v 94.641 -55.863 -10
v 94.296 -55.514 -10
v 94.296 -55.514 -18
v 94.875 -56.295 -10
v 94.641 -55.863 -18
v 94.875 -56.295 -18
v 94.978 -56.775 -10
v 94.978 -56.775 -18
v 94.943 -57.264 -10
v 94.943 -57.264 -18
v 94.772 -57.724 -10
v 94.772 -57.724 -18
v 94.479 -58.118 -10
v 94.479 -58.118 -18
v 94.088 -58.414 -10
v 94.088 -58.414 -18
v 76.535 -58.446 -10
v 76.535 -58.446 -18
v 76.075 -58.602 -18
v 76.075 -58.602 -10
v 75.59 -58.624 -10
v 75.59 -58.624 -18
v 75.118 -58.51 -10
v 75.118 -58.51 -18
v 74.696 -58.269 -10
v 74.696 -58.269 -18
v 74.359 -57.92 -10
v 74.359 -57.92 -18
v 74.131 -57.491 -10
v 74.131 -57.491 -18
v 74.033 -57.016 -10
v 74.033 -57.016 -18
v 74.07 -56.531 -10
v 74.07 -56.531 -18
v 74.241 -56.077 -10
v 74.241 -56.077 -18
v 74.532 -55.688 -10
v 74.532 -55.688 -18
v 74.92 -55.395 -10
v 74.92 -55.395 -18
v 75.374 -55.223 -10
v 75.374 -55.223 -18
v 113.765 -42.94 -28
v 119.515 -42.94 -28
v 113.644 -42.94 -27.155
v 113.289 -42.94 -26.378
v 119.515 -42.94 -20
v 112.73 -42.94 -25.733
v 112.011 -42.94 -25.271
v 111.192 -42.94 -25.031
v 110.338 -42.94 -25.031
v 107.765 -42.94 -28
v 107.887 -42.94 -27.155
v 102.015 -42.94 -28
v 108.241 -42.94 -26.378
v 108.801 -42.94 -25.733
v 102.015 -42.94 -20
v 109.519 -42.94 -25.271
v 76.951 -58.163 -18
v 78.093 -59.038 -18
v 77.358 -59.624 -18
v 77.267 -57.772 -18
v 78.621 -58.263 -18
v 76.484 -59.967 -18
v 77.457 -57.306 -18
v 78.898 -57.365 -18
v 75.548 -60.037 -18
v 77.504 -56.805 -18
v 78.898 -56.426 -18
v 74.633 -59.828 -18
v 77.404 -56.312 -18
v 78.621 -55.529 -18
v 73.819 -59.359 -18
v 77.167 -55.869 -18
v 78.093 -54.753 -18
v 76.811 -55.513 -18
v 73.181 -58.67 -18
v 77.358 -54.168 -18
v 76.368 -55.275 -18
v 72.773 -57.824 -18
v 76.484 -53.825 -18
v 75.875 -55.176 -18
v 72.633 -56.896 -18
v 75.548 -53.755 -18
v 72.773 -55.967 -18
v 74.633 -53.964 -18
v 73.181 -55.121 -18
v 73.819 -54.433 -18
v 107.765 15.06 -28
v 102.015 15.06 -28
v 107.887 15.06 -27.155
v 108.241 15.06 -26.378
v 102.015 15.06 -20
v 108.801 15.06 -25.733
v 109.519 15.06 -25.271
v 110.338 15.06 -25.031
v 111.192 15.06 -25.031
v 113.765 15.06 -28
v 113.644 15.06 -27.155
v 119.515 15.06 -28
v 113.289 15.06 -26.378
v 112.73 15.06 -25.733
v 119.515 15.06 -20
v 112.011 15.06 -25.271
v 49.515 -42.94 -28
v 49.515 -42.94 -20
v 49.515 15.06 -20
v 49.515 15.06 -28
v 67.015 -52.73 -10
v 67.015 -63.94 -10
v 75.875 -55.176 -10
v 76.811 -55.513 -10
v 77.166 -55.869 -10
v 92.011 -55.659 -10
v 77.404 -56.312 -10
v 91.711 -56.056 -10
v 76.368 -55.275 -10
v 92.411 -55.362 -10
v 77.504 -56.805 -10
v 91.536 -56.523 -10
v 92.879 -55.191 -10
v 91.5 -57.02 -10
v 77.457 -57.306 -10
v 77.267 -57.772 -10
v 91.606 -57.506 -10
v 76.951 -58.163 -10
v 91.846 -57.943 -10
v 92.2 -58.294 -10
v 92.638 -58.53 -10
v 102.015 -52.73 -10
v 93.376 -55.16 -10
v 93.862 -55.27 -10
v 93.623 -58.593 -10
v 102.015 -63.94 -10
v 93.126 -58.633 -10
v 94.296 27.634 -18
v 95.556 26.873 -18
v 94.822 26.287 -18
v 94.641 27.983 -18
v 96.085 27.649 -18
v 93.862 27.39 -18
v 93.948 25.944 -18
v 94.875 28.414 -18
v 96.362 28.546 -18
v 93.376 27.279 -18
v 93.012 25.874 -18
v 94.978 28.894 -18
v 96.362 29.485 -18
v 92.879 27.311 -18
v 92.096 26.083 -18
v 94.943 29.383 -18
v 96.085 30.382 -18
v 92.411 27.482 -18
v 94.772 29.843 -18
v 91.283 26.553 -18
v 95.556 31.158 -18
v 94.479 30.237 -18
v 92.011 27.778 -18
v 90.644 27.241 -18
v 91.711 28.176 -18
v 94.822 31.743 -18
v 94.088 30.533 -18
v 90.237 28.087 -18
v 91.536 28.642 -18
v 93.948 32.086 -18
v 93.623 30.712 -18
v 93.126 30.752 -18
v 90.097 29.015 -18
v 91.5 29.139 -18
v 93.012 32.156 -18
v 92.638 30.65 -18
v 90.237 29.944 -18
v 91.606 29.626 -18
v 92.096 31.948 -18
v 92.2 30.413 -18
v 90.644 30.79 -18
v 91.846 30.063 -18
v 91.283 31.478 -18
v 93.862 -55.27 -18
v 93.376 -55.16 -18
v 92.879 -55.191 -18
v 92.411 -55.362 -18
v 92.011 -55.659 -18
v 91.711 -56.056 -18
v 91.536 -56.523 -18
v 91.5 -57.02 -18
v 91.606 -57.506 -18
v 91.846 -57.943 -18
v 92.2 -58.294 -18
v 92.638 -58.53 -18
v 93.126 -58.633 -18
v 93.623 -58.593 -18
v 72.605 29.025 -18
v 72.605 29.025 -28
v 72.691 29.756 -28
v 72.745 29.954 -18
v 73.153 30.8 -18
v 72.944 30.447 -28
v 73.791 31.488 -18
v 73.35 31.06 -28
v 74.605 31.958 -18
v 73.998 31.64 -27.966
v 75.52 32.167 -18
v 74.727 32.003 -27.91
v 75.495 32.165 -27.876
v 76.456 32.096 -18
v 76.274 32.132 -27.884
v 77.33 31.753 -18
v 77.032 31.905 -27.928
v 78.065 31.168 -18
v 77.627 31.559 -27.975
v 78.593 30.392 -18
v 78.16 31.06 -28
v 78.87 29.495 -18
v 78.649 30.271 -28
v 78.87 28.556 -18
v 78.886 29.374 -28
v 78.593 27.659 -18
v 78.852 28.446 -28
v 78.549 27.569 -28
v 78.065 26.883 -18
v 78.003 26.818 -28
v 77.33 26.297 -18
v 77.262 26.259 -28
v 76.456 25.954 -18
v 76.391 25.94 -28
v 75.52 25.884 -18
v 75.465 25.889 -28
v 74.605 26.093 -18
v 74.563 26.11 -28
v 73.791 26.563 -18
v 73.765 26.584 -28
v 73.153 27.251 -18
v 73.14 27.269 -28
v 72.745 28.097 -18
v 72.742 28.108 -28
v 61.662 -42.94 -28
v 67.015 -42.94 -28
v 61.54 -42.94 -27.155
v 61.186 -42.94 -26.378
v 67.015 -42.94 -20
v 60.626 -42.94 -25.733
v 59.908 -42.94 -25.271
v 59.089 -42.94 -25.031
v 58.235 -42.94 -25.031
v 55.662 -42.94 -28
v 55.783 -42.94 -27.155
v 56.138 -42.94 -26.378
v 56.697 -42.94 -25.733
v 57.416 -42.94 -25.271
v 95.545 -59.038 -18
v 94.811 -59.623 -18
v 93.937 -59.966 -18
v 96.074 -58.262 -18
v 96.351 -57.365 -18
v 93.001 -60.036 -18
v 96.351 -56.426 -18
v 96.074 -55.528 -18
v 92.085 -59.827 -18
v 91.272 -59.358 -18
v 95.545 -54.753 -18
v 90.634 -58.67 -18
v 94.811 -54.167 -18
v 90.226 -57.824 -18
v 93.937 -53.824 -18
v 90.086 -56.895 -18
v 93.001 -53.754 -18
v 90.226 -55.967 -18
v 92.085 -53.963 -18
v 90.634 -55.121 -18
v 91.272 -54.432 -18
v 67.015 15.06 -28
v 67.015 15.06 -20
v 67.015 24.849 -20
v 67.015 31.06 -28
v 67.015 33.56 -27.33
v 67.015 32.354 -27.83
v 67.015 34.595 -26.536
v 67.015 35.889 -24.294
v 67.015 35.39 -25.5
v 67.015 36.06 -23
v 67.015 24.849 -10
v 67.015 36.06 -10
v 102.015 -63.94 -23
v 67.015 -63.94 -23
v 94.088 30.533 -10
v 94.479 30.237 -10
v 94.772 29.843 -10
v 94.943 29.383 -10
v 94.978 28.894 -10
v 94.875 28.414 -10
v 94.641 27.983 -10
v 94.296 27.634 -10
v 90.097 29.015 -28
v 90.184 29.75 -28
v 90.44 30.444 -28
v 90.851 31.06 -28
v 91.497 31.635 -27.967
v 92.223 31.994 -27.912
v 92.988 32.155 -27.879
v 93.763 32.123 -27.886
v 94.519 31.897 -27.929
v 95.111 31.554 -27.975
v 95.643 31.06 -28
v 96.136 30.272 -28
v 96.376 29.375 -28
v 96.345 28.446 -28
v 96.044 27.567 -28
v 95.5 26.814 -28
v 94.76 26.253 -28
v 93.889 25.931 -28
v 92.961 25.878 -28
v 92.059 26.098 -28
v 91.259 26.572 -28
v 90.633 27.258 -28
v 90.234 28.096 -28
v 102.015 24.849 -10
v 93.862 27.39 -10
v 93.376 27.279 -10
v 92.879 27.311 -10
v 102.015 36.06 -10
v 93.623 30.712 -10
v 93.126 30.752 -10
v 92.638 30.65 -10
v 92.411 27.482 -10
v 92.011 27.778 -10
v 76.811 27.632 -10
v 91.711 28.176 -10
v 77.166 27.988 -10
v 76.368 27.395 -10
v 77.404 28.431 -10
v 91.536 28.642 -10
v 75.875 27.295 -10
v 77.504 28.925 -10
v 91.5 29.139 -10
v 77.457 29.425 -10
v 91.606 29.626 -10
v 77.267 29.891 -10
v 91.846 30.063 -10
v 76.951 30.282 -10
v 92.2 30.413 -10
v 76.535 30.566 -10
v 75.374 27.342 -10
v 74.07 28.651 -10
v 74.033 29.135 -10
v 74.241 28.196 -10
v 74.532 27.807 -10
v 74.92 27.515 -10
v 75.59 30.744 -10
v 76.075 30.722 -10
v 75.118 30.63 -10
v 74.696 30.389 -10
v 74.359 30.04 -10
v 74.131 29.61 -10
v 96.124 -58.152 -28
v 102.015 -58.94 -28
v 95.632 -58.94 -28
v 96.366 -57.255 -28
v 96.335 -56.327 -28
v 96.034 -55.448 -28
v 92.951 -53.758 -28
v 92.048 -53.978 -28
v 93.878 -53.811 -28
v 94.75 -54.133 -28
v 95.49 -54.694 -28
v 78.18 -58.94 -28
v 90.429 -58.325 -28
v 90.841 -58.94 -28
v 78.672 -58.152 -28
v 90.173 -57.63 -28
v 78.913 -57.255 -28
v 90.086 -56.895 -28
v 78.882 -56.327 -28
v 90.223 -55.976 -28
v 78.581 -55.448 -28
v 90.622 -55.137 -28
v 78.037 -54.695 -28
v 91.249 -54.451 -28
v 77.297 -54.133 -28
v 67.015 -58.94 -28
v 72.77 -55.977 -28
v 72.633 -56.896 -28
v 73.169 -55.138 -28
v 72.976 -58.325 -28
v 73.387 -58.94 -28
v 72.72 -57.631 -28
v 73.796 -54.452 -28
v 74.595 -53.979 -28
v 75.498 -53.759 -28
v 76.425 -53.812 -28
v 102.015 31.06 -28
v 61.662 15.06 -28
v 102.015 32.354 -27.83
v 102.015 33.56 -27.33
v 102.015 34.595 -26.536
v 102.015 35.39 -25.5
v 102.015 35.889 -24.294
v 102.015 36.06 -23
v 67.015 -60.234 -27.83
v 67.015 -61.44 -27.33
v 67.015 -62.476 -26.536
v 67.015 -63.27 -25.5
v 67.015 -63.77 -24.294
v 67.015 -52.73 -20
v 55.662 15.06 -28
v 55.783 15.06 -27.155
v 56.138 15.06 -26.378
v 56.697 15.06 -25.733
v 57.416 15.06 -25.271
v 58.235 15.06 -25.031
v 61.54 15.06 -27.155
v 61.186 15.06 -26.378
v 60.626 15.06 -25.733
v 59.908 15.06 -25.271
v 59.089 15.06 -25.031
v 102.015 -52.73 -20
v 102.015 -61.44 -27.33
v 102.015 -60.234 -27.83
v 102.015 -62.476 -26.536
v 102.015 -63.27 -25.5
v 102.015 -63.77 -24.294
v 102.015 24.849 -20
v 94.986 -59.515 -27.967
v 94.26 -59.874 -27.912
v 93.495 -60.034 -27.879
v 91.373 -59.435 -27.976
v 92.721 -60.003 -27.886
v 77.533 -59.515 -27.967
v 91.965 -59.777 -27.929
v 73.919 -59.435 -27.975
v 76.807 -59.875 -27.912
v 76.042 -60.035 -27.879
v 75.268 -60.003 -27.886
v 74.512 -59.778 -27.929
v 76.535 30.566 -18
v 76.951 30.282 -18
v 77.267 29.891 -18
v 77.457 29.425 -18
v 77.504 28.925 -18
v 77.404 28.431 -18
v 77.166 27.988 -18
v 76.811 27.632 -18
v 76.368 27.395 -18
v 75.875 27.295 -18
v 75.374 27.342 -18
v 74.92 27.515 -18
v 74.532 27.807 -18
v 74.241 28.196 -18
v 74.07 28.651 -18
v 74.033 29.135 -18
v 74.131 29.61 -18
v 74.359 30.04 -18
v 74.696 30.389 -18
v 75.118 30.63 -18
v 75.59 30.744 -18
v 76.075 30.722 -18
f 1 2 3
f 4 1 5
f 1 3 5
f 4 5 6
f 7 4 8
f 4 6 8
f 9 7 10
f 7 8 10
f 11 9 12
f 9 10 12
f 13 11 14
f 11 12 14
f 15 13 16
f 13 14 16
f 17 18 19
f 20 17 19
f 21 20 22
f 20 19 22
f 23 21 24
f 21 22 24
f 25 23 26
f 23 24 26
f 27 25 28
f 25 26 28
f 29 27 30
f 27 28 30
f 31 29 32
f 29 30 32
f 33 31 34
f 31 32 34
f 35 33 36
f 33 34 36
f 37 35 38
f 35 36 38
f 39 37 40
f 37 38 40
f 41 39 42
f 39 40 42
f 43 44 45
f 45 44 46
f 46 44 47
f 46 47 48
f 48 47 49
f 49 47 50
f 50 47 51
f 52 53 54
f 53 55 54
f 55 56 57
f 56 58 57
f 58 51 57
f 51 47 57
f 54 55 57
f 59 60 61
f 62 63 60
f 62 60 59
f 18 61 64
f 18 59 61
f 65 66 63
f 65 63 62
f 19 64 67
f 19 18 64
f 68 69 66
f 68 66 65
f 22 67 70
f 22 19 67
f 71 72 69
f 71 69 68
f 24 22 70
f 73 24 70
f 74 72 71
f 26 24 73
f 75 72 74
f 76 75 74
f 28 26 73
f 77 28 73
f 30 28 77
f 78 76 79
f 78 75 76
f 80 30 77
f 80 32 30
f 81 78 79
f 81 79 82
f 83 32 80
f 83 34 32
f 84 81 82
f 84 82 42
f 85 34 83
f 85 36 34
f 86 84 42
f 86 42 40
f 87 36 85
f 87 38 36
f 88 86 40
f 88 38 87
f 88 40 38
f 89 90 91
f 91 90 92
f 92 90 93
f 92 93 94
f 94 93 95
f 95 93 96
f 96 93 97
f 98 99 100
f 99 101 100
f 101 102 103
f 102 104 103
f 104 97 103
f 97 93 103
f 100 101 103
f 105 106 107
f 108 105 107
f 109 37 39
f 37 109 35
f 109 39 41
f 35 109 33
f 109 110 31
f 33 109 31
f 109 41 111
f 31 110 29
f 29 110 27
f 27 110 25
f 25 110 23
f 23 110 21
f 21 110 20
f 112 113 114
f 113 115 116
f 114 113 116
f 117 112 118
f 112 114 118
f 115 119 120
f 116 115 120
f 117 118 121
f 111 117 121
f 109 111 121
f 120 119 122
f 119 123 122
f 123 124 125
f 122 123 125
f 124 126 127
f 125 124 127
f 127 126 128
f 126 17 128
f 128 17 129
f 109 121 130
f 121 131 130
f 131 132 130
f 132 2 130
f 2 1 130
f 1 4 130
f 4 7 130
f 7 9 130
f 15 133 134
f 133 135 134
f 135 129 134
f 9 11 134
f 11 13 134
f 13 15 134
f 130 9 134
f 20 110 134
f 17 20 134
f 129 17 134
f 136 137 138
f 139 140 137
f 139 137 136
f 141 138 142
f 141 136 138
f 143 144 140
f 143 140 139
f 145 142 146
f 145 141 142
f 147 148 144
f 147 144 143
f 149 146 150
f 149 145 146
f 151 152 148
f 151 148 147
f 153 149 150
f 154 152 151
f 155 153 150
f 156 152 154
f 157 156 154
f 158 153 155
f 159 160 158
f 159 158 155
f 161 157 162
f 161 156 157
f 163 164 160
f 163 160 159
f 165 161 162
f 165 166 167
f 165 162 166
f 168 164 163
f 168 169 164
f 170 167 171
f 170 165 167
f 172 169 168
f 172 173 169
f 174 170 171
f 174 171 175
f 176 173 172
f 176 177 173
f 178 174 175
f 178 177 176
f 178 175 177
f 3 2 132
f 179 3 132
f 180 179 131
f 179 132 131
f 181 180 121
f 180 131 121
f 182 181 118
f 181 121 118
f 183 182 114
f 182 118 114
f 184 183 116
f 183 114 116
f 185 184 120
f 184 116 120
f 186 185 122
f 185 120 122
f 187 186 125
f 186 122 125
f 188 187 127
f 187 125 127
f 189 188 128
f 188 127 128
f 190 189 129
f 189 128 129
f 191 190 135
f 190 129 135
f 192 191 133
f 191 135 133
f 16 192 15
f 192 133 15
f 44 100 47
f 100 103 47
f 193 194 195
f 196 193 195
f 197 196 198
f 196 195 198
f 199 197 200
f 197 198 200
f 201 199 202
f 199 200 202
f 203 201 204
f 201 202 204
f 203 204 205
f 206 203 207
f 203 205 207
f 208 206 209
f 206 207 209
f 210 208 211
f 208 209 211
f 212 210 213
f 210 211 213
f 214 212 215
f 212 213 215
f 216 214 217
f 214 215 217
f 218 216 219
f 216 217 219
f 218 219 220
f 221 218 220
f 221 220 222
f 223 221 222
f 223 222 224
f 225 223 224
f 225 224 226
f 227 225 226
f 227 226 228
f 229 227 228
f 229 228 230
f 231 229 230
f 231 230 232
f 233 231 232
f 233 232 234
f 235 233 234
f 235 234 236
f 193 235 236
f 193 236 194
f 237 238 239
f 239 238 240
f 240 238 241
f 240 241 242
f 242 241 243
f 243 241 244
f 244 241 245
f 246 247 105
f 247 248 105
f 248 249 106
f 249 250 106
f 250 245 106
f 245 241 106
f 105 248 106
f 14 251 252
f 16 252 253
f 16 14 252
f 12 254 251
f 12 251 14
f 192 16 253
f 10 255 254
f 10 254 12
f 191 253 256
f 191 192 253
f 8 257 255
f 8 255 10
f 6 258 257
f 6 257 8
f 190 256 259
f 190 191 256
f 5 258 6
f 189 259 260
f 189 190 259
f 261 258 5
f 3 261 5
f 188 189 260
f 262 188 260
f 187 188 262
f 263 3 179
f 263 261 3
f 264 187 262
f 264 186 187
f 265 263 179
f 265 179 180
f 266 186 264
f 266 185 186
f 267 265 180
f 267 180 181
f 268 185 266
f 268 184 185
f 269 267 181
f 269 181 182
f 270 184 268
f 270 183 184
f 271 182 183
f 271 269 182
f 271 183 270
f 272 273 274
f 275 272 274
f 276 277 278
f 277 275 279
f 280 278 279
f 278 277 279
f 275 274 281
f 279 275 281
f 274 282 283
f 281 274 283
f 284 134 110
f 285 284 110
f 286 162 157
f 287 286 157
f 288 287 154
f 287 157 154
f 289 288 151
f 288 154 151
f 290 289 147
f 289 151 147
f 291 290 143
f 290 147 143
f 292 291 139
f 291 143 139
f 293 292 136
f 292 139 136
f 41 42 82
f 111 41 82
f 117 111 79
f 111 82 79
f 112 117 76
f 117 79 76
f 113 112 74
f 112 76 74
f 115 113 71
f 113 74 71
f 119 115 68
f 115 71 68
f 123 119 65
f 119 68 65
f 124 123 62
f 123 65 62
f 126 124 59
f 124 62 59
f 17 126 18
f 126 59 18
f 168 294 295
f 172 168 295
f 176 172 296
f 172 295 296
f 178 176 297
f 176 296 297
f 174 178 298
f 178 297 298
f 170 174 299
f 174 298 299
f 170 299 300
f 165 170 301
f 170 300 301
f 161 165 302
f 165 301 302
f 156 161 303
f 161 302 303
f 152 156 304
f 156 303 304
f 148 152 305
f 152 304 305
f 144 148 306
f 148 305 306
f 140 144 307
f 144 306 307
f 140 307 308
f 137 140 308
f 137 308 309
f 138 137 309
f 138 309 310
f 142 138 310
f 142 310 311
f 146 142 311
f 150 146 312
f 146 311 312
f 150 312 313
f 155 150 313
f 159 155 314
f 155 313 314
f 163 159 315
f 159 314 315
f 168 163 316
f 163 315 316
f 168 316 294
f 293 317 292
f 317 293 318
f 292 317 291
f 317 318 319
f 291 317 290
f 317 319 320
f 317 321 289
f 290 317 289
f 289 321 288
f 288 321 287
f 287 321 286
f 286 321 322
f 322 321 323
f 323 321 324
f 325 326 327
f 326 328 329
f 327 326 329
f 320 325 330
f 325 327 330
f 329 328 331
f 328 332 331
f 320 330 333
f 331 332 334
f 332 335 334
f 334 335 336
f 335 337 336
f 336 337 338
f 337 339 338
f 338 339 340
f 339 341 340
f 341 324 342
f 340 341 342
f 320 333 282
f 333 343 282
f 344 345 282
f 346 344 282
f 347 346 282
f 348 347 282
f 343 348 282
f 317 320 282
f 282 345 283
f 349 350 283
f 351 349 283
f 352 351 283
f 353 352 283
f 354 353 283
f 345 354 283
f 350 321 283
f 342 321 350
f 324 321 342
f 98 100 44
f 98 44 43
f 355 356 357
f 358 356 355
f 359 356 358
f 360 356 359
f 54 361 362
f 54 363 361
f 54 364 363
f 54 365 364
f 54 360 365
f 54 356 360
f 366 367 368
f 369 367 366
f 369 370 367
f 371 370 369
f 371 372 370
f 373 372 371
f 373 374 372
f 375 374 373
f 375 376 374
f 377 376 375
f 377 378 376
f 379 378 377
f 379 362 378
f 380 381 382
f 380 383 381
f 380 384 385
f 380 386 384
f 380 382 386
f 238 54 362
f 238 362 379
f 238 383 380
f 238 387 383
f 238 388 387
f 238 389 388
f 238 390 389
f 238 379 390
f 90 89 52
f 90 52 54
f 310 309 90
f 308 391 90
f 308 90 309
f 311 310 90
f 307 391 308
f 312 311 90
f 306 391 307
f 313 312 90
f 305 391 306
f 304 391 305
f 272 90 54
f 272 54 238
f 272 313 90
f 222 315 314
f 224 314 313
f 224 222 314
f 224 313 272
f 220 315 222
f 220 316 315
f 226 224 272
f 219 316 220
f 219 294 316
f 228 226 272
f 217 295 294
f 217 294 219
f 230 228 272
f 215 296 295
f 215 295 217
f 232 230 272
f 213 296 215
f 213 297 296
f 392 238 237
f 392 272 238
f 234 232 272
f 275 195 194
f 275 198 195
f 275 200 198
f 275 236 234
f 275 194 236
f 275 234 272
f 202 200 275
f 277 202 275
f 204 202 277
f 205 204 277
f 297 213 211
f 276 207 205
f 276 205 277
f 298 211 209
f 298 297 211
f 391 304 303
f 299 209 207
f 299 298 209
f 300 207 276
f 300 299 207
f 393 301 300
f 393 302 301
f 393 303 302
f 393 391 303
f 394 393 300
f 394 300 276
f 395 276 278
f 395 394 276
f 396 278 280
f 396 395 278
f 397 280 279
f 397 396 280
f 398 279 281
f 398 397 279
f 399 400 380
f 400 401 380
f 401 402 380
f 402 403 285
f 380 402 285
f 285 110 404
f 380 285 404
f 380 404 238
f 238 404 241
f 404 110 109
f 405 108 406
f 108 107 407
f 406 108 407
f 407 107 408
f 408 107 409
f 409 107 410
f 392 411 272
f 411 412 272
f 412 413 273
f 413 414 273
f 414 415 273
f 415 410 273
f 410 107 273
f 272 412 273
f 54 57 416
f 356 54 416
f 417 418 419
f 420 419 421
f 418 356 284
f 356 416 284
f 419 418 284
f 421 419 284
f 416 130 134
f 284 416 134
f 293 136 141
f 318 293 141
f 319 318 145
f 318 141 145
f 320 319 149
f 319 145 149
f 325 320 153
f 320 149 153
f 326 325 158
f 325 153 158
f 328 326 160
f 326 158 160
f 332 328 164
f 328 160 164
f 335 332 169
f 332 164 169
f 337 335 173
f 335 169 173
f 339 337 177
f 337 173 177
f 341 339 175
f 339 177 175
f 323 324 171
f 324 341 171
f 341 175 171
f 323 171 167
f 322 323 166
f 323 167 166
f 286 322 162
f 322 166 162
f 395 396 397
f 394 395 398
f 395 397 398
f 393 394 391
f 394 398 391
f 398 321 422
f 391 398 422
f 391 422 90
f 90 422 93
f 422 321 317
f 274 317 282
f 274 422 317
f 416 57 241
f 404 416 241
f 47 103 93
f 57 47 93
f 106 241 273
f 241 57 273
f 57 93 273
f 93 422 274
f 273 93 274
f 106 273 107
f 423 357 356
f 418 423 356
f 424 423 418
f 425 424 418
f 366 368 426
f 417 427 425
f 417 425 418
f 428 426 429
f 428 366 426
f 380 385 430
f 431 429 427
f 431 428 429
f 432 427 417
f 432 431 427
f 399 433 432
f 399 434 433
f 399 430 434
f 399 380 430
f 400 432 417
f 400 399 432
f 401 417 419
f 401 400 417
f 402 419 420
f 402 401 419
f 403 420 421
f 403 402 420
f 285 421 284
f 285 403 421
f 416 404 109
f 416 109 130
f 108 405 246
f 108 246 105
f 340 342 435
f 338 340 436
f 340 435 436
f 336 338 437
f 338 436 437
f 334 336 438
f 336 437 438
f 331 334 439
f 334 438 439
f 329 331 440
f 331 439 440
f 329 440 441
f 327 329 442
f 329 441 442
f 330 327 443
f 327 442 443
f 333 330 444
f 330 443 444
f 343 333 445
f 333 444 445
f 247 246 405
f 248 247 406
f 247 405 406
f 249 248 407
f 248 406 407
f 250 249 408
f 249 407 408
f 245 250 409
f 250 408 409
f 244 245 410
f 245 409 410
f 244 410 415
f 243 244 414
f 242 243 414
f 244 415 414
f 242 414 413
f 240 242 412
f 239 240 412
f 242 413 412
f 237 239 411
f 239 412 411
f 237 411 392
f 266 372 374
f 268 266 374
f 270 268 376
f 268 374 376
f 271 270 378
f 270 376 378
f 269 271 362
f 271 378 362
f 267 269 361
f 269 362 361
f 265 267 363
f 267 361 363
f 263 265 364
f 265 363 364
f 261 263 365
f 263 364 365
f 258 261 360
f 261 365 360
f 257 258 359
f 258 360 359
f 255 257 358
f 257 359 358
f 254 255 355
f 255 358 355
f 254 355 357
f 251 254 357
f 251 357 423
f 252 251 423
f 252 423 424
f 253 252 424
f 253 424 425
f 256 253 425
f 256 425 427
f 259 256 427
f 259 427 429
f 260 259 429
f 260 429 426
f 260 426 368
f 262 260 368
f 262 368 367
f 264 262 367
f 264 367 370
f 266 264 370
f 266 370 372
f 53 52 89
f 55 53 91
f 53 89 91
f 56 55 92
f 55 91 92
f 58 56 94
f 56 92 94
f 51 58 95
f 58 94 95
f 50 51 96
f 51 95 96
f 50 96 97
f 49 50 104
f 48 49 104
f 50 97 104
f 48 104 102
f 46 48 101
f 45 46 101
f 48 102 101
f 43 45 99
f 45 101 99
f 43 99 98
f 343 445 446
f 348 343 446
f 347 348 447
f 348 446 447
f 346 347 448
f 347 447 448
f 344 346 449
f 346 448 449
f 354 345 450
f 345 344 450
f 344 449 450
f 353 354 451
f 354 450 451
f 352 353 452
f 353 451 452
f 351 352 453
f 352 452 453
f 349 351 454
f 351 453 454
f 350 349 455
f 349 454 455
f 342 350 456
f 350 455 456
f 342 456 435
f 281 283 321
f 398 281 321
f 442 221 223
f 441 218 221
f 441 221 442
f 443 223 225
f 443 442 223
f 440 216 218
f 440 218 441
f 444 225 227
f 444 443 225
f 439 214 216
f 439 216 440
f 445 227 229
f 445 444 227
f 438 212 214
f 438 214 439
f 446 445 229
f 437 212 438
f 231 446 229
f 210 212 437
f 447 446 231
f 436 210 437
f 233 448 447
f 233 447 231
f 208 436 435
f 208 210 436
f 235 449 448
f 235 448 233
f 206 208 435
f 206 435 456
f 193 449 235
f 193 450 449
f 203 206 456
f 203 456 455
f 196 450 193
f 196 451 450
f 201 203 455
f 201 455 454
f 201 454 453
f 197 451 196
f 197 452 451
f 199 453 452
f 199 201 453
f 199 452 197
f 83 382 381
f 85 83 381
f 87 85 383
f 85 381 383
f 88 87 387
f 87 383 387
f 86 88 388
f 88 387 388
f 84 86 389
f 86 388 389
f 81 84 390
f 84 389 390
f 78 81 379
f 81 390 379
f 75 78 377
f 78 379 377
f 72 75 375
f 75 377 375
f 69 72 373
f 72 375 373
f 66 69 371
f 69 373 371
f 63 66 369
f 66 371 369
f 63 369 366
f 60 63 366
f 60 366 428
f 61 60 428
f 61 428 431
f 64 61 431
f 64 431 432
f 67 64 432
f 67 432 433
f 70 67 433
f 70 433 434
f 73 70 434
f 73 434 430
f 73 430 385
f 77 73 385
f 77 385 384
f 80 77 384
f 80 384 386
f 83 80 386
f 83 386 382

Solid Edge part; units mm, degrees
sketch "Sketch1" plane through (0, 0, -20) normal (0, 0, -1) x (-1, 0, 0)
  line L0 (-67.0152, -63.9403) -> (-67.0152, -42.9403)
  line L1 (-67.0152, -42.9403) -> (-49.5152, -42.9403)
  line L2 (-49.5152, -42.9403) -> (-49.5152, 15.0597)
  line L3 (-49.5152, 15.0597) -> (-67.0152, 15.0597)
  line L4 (-67.0152, 15.0597) -> (-67.0152, 36.0597)
  line L5 (-67.0152, 36.0597) -> (-102.0152, 36.0597)
  line L6 (-102.0152, 36.0597) -> (-102.0152, 15.0597)
  line L7 (-102.0152, 15.0597) -> (-119.5152, 15.0597)
  line L8 (-119.5152, 15.0597) -> (-119.5152, -42.9403)
  line L9 (-119.5152, -42.9403) -> (-102.0152, -42.9403)
  line L10 (-102.0152, -42.9403) -> (-102.0152, -63.9403)
  line L11 (-102.0152, -63.9403) -> (-67.0152, -63.9403)
  circle A0 centre (-75.7833, -56.8959) radius 1.7228
  circle A1 centre (-93.2363, -56.8951) radius 1.741
  circle A2 centre (-93.247, 29.0153) radius 1.735
  circle A3 centre (-75.7554, 29.0254) radius 1.7262
extrude "Protrusion1" add sketch "Sketch1" along normal blind 8
sketch "Sketch2" plane through (84.5152, -13.9403, -20) normal (0, 0, 1) x (0, -1, 0)
  arc A0 (-41.5739, 9.7812) -> (-44.4734, 9.5724) centre (-42.9556, 8.7318) ccw
  arc A1 (-44.4734, 9.5724) -> (-41.5739, 9.7812) centre (-42.9548, 8.7211) ccw
  line L0 (-38.7893, 17.5) -> (-38.7893, -17.5)
  line L1 (-38.7893, -17.5) -> (-50, -17.5)
  line L2 (-50, -17.5) -> (-50, 17.5)
  line L3 (-50, 17.5) -> (-38.7893, 17.5)
  arc A2 (-44.5058, -7.9803) -> (-41.2822, -9.1415) centre (-42.9657, -8.7598) ccw
  arc A3 (-41.2822, -9.1415) -> (-44.5058, -7.9803) centre (-42.9556, -8.7318) ccw
extrude "ExtrudedCutout_1" add sketch "Sketch2" along normal blind 10
fillet "Round_1" radius 5 1 edges at (84.5152, 36.0597, -28)
mirror "Mirror1" about plane through (84.5152, -13.9403, -24) normal (0, -1, 0) of "ExtrudedCutout_1"
fillet "Round1" radius 5 1 edges at (84.5152, -63.9403, -28)
sketch "Sketch3" plane through (84.5152, -13.9403, -28) normal (0, 0, -1) x (-1, 0, 0)
  circle A0 centre (-8.7318, 42.9556) radius 3.15
  circle A1 centre (-8.7318, 42.9556) radius 1.735
  circle A2 centre (8.7598, 42.9657) radius 3.15
  circle A3 centre (8.7598, 42.9657) radius 1.7262
  circle A4 centre (-8.7211, -42.9548) radius 3.15
  circle A5 centre (-8.7211, -42.9548) radius 1.741
  circle A6 centre (8.7318, -42.9556) radius 3.15
  circle A7 centre (8.7318, -42.9556) radius 1.7228
extrude "ExtrudedCutout_2" cut sketch "Sketch3" against normal blind 10
sketch "Sketch4" plane through (110.7652, 15.0597, -24) normal (0, 1, 0) x (0, 0, -1)
  arc A0 (4, 49.1033) -> (4, 55.1033) centre (4, 52.1033) cw
  line L0 (4, 55.1033) -> (4, 49.1033)
  arc A1 (4, -3) -> (4, 3) centre (4, 0) cw
  line L1 (4, 3) -> (4, -3)
extrude "ExtrudedCutout_3" cut sketch "Sketch4" against normal blind 119
